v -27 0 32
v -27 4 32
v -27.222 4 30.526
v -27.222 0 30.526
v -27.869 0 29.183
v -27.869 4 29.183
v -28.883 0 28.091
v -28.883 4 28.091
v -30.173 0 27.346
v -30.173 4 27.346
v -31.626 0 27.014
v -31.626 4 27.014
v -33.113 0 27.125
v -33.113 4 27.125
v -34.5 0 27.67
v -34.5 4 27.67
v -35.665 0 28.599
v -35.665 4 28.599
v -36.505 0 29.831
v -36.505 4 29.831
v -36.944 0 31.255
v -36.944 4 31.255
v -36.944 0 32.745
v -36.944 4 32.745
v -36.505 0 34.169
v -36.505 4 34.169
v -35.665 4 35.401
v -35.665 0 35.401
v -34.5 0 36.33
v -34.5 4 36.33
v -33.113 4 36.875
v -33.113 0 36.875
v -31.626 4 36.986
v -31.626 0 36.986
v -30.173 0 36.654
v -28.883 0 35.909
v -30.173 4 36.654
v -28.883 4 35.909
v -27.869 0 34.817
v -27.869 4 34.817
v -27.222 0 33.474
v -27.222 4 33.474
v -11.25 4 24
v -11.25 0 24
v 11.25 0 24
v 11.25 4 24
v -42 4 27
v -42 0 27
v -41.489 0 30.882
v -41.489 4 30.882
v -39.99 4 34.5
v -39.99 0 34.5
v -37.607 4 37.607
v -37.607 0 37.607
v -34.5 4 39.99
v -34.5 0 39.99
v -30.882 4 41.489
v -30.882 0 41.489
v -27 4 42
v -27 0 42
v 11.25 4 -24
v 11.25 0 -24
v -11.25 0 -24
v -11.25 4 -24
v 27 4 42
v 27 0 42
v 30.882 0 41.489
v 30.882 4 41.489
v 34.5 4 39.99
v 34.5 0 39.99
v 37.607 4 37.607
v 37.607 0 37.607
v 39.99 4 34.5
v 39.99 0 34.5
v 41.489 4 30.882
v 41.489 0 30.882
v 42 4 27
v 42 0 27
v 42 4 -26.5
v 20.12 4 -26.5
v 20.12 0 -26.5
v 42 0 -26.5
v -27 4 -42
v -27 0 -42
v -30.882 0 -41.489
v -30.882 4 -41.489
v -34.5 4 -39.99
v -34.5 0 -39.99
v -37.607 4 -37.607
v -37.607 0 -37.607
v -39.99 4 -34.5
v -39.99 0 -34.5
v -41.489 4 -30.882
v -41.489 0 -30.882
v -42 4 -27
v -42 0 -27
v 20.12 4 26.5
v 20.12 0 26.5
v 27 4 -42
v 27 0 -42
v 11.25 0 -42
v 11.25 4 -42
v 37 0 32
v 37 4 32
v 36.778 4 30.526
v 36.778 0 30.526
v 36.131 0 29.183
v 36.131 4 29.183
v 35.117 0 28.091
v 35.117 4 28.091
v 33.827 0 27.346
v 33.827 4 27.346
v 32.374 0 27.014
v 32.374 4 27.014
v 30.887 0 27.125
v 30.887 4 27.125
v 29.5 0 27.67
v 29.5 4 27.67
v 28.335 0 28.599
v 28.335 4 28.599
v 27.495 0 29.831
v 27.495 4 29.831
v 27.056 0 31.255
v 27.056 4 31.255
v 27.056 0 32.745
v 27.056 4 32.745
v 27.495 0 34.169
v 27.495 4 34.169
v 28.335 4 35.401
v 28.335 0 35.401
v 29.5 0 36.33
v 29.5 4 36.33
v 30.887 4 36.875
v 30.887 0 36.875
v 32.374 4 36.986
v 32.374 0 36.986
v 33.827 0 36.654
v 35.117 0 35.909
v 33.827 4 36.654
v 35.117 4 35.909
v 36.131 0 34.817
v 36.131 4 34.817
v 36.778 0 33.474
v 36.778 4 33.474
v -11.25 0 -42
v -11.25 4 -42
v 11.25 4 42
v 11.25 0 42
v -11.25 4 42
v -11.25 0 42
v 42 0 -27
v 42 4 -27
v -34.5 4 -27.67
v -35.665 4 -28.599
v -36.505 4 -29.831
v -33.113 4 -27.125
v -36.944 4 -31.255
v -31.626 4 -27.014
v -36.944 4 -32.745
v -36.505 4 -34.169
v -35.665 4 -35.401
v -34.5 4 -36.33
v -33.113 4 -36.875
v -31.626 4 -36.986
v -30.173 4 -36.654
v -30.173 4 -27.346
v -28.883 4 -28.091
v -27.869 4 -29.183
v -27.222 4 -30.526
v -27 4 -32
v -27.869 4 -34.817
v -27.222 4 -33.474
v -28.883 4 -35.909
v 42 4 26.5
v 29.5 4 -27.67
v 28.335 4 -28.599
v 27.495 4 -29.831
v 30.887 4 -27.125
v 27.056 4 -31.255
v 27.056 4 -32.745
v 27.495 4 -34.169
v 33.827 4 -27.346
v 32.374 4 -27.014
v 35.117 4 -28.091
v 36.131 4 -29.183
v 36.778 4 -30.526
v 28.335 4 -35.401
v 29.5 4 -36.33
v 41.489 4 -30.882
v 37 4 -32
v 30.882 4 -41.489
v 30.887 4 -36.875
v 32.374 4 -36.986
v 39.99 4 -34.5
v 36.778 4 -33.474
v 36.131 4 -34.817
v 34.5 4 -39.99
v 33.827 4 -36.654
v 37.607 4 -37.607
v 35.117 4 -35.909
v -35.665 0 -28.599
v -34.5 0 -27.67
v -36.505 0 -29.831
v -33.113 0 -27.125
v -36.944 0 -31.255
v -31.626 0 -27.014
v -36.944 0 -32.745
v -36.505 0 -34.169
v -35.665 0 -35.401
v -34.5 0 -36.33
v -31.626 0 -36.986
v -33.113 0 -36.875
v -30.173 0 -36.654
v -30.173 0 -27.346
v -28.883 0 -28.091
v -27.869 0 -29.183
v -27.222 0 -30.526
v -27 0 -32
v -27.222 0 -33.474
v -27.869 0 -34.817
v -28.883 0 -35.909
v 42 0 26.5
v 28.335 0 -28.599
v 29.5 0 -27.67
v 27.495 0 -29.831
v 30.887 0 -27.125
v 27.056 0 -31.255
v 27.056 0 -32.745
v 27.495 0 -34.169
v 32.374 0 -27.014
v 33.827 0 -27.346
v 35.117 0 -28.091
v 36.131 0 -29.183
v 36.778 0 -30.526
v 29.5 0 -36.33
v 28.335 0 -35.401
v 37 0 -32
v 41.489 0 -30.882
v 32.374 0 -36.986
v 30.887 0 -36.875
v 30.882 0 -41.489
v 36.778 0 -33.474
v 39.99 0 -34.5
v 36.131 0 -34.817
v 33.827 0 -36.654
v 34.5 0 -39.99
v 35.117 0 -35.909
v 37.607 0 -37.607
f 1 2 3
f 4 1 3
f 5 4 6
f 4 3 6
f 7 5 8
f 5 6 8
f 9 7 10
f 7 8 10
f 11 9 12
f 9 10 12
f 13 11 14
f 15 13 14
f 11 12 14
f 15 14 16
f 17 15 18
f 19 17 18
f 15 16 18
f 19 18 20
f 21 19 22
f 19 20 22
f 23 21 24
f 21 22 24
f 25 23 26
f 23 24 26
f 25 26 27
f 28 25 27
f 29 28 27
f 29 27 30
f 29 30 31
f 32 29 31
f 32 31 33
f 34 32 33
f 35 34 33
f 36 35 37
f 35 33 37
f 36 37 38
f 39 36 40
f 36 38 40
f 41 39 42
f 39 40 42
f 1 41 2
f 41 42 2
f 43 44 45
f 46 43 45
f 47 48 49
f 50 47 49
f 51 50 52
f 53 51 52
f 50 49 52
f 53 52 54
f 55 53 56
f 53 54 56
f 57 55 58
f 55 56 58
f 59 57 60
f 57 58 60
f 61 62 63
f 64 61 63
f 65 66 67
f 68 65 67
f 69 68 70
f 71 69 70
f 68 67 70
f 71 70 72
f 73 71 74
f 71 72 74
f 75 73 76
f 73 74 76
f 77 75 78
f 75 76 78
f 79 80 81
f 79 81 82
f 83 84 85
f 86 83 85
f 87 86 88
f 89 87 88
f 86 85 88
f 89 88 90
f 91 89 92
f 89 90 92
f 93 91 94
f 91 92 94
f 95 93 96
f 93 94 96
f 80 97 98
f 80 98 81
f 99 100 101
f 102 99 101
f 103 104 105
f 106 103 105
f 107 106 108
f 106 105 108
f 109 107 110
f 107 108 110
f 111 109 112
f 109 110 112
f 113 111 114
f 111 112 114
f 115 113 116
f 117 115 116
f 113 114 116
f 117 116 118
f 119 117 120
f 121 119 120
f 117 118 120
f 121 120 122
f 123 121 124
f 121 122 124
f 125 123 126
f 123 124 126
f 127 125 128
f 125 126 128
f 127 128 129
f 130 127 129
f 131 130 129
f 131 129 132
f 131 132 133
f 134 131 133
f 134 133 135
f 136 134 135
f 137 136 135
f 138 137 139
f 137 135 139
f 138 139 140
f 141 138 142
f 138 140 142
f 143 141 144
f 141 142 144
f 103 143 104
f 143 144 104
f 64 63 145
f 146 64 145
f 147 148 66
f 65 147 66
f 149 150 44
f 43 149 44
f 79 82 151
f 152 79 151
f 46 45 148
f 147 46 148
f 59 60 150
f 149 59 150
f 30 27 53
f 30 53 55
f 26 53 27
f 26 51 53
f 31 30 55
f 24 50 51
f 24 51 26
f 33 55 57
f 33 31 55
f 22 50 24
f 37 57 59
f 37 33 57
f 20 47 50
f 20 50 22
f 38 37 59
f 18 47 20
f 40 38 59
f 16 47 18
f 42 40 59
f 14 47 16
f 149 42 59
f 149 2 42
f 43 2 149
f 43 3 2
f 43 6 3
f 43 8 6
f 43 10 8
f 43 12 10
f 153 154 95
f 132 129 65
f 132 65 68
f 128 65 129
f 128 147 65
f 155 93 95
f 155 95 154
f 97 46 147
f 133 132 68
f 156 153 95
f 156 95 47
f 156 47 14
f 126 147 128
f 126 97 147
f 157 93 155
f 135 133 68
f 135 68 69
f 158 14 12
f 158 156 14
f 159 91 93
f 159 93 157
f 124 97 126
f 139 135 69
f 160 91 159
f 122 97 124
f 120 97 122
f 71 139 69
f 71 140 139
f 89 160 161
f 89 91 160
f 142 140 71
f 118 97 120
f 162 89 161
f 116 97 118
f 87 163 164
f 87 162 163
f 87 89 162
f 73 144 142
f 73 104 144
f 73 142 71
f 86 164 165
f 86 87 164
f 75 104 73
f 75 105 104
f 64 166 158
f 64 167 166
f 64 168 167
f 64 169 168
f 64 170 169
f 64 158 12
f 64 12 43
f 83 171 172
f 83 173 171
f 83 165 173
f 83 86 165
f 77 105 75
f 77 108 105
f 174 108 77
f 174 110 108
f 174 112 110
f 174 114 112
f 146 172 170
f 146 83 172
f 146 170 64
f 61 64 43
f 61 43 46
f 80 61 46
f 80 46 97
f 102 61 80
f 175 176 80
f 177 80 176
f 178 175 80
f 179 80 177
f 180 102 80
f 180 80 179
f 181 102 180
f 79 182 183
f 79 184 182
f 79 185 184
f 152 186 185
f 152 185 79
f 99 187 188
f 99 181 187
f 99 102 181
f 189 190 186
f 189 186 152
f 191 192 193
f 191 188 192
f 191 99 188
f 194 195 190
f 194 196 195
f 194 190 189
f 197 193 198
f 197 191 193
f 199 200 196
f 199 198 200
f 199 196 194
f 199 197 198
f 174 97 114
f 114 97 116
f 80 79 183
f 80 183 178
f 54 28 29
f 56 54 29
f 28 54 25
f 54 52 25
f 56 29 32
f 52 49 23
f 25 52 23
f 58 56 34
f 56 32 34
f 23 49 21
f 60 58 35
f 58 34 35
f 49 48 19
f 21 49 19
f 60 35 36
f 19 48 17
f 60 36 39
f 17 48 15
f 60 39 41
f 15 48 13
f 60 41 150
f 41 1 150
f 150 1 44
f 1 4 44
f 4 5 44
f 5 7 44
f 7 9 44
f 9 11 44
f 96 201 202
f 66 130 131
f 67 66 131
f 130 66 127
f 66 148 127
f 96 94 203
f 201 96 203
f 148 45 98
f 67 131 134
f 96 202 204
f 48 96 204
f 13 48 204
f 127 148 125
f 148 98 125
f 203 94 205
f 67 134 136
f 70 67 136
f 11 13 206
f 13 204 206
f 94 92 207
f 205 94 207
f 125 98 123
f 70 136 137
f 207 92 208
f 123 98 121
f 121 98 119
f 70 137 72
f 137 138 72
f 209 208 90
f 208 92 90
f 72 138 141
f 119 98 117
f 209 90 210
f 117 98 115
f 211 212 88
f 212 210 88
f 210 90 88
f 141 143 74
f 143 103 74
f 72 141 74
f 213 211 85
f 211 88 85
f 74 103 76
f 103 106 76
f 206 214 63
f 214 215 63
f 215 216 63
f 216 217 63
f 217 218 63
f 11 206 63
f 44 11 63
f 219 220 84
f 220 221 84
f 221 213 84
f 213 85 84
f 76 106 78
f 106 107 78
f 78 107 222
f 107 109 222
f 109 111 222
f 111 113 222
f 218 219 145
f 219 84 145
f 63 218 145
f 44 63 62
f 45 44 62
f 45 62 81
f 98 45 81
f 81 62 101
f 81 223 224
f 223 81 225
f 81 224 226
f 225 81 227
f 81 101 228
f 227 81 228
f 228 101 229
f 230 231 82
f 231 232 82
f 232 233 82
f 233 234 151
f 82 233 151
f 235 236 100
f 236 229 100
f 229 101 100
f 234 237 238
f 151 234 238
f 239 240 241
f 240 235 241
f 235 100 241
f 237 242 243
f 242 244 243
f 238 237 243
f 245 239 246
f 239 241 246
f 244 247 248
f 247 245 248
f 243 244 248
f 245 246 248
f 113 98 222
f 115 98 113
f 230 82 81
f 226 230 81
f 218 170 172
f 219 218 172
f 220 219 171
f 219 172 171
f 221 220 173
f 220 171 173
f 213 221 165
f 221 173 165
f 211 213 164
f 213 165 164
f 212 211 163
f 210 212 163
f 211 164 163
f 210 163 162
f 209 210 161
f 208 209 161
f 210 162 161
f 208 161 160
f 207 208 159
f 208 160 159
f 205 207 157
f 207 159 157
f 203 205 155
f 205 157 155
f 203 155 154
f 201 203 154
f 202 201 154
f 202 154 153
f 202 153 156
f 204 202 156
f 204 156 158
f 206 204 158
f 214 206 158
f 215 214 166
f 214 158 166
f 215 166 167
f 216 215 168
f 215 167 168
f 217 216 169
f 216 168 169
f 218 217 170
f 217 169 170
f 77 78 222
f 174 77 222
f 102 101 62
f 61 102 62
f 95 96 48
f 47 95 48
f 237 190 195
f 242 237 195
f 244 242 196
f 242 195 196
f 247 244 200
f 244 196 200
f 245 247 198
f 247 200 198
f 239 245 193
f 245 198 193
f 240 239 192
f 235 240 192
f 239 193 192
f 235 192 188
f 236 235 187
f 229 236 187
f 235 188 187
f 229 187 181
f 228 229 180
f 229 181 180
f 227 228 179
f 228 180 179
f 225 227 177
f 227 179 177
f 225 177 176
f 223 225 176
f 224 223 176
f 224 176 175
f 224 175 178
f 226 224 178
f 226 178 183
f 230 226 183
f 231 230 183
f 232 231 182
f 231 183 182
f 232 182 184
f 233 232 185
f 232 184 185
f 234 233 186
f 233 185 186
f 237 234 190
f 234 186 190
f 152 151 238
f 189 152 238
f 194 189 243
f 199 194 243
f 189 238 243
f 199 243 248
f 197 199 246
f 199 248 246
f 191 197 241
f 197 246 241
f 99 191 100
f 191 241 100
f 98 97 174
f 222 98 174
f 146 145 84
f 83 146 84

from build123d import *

# Parameters (mm, degrees)
BOSS_EXTRUDE1_DEPTH = 4
SKETCH4_W           = 21.88
SKETCH4_H           = 53
SKETCH4_R           = 5
CUT_EXTRUDE1_DEPTH  = 4


with BuildPart() as part:
    # Layer1 → Boss-Extrude1 (new body)
    with BuildSketch(Plane(origin=(0, 0, 0), x_dir=(1, 0, 0), z_dir=(0, 1, 0))):
        with BuildLine():
            Line((27, 42), (11.25, 42))
            Line((11.25, 42), (11.25, 24))
            Line((11.25, 24), (-11.25, 24))
            Line((-11.25, 24), (-11.25, 42))
            Line((-11.25, 42), (-27, 42))
            ThreePointArc((-27, 42), (-37.606601718, 37.606601718), (-42, 27))
            Line((-42, 27), (-42, 21.5))
            Line((-42, 21.5), (-42, -21.5))
            Line((-42, -21.5), (-42, -27))
            ThreePointArc((-42, -27), (-37.606601718, -37.606601718), (-27, -42))
            Line((-27, -42), (-11.25, -42))
            Line((-11.25, -42), (-11.25, -24))
            Line((-11.25, -24), (11.25, -24))
            Line((11.25, -24), (11.25, -42))
            Line((11.25, -42), (27, -42))
            ThreePointArc((27, -42), (37.606601718, -37.606601718), (42, -27))
            Line((42, -27), (42, 27))
            ThreePointArc((42, 27), (37.606601718, 37.606601718), (27, 42))
        make_face()
    extrude(amount=BOSS_EXTRUDE1_DEPTH)

    # Sketch4 → Cut-Extrude1 (cut)
    with BuildSketch(Plane(origin=(0, 4, 0), x_dir=(1, 0, 0), z_dir=(0, 1, 0))):
        with Locations((31.06, 0)):
            Rectangle(SKETCH4_W, SKETCH4_H)
        with Locations((32, 32)):
            Circle(SKETCH4_R)
        with Locations((-32, 32)):
            Circle(SKETCH4_R)
        with Locations((-32, -32)):
            Circle(SKETCH4_R)
        with Locations((32, -32)):
            Circle(SKETCH4_R)
    extrude(amount=-CUT_EXTRUDE1_DEPTH, mode=Mode.SUBTRACT)


solid = part.part
